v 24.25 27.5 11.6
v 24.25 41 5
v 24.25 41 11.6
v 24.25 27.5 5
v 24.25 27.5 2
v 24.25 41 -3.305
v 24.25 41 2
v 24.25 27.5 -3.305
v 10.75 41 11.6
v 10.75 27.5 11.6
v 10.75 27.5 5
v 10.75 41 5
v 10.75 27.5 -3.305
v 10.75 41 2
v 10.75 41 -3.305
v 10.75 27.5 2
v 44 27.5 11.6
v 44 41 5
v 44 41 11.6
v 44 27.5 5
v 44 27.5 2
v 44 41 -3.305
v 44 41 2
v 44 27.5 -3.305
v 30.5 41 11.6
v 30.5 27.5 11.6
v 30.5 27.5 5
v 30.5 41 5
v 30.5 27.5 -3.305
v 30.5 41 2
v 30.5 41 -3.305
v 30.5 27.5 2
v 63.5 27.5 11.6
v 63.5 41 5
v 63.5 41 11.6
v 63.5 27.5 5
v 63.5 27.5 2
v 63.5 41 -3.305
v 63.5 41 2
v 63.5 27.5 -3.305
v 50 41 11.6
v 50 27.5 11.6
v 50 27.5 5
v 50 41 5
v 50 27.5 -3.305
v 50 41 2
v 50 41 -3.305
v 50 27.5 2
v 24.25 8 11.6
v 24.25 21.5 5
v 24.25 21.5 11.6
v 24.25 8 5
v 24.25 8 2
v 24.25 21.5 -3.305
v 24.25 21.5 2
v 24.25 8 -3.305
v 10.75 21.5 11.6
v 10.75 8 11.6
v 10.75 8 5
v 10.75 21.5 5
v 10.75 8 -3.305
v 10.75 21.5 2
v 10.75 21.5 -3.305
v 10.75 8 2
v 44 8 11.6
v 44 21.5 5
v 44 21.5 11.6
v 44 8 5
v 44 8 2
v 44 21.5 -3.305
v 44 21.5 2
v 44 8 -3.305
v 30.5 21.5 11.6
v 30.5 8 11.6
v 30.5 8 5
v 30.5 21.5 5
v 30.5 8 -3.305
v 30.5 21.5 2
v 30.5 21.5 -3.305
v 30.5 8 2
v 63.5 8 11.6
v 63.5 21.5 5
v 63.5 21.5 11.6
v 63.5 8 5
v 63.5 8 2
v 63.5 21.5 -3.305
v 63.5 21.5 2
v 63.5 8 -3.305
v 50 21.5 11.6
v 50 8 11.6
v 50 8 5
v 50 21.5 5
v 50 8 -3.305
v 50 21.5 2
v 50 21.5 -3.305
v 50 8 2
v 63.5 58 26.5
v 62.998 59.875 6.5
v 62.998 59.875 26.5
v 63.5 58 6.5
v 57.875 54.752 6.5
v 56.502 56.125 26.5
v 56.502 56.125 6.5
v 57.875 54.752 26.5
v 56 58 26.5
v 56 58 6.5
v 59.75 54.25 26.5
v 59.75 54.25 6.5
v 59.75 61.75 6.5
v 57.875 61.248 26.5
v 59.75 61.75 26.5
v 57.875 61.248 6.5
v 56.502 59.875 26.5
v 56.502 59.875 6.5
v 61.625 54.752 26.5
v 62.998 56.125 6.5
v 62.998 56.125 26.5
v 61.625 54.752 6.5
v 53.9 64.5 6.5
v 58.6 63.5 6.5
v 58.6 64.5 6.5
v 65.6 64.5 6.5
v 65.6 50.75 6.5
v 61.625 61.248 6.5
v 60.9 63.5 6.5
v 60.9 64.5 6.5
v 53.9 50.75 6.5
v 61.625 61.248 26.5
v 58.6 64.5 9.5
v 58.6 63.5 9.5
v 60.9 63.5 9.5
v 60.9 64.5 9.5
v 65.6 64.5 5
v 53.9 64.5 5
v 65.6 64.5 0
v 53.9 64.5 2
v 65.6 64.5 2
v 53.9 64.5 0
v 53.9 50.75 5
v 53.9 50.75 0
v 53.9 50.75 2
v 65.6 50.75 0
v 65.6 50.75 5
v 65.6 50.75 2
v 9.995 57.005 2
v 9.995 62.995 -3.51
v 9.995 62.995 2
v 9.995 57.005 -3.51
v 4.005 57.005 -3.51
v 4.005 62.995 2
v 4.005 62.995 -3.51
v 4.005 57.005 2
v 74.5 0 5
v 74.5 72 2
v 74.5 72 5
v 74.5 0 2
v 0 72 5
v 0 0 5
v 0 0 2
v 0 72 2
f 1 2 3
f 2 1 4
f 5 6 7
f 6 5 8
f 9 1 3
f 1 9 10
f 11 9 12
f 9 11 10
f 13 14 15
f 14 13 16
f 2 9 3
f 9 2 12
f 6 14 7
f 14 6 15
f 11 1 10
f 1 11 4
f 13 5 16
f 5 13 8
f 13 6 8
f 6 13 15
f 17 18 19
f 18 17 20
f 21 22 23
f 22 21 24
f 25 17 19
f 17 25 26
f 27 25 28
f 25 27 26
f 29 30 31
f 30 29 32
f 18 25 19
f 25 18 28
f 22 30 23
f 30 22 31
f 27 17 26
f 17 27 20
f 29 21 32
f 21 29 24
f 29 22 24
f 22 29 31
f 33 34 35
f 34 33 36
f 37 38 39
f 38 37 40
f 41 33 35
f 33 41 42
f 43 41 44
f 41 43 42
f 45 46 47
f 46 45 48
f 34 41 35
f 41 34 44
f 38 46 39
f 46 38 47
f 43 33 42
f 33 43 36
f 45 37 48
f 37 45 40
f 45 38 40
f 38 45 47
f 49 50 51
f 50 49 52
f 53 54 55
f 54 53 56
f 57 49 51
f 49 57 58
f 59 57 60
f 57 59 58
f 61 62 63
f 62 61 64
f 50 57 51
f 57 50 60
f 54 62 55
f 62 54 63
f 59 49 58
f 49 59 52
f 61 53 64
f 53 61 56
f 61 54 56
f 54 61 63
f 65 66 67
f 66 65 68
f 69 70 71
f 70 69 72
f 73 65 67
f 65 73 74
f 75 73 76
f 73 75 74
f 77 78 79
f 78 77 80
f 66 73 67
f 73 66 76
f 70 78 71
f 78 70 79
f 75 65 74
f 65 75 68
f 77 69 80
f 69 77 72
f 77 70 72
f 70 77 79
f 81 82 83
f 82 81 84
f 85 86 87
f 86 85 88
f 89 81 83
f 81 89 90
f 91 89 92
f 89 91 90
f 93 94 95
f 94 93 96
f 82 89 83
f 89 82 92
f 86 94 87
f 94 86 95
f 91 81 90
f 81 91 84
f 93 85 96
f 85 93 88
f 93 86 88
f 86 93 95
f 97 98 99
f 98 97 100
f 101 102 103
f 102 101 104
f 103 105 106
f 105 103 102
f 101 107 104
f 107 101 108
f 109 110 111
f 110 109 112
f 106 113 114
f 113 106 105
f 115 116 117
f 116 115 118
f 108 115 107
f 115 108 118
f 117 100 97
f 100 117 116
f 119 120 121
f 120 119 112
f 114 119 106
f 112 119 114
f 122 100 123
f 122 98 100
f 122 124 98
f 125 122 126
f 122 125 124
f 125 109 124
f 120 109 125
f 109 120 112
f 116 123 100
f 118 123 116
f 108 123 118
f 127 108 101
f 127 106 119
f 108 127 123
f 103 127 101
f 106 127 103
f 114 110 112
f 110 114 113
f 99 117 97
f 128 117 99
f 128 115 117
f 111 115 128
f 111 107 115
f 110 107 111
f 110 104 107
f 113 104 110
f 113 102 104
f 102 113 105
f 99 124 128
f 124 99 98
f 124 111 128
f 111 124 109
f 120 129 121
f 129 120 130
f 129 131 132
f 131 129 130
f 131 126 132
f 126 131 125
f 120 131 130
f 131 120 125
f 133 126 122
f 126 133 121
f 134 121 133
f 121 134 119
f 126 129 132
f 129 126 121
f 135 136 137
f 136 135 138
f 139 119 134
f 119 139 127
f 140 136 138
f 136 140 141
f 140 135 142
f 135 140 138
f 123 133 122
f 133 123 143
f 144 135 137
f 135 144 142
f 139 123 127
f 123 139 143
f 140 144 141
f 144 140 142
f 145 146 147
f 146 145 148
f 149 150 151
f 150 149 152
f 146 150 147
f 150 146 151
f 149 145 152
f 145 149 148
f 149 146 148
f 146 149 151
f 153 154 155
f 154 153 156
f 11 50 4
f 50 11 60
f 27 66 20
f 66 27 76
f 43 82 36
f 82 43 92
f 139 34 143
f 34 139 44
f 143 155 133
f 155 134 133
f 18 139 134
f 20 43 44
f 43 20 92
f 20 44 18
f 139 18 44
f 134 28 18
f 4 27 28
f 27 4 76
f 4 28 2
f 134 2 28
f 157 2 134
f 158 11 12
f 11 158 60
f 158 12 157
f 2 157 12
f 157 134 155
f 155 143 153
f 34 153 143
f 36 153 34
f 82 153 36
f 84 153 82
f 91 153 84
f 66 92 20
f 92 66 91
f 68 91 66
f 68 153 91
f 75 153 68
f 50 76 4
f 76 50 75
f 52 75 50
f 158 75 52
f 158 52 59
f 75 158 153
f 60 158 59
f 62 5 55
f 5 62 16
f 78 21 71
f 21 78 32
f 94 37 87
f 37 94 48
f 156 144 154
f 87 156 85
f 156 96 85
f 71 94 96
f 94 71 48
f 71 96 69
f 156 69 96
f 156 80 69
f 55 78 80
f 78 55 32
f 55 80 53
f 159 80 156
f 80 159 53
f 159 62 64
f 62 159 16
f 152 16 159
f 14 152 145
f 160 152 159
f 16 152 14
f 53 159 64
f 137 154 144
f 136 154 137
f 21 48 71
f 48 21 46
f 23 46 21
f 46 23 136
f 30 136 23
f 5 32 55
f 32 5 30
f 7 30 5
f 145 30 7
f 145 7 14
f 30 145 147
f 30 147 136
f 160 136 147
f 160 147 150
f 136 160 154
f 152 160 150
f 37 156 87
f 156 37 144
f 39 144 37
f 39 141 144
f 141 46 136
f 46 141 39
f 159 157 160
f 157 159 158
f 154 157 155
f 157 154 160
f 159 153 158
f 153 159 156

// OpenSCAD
// file: ../../libs/flat-ui-colors.scad
flatui = [
    "#1abc9c",
    "#2ecc71",
    "#3498db",
    "#9b59b6",
    "#34495e",
    "#f1c40f",
    "#e67e22",
    "#e74c3c",
    "#ecf0f1",
    "#95a5a6",
];
// file: ../../libs/teeth.scad
function hash(h,k)= 
(
  h[search([k], h)[0]][1]
); 

module placeTeethY(start, step, count, size) {
    for(i = [0:count]) {
        y = start + (i * step);
        translate([0, y, 0])
        cube(size, center=true);
    }
}

module placeTeethZ(start, step, count, size) {
    for(i = [0:count]) {
        z = start + (i * step);
        translate([0, 0, z])
        cube(size, center=true);
    }
}

module verticalTeeth(translateZ, widthY, depthX, heightZ, count, size, height, spaceBetween = false, padding = 0, nothing = 0.1) {
    avSpace = widthY - (size * count);
    padding = (padding==undef) ? 0 : padding;
    ts = [depthX + nothing + padding, size, height + nothing + padding];
    if (spaceBetween) {
        tbSpace = avSpace / (count - 1);
        tbStep = tbSpace + size;
        tbStart = -(widthY / 2) + (size / 2);
        
        translate([0, 0, translateZ])
        placeTeethY(tbStart, tbStep, count-1, ts);
    } else {
        tbSpace = avSpace / (count + 1);
        tbStep = tbSpace + size;
        tbStart = -(widthY / 2) + tbSpace + (size / 2);
        
        translate([0, 0, translateZ])
        placeTeethY(tbStart, tbStep, count-1, ts);
    }
}

module horizontalTeeth(translateY, widthY, depthX, heightZ, count, size, height, spaceBetween = false, padding = 0, nothing = 0.1) {
    avSpace = heightZ - (size * count);
    padding = (padding==undef) ? 0 : padding;
    ts = [depthX + nothing + padding, height + nothing + padding, size];
    if (spaceBetween) {
        tbSpace = avSpace / (count - 1);
        tbStep = tbSpace + size;
        tbStart = -(heightZ / 2) + (size / 2);
        
        translate([0, translateY, 0])
        placeTeethZ(tbStart, tbStep, count-1, ts);
    } else {
        tbSpace = avSpace / (count + 1);
        tbStep = tbSpace + size;
        tbStart = -(heightZ / 2) + tbSpace + (size / 2);
        
        translate([0, translateY, 0])
        placeTeethZ(tbStart, tbStep, count-1, ts);
    }
}

module bottomTeeth(widthY, depthX, heightZ, count, size, height, spaceBetween = false, padding = 0, nothing = 0.1) {
    z = -(heightZ / 2)-(height/2);
    verticalTeeth(z, widthY, depthX, heightZ, count, size, height, spaceBetween, padding, nothing);
}

module topTeeth(widthY, depthX, heightZ, count, size, height, spaceBetween = false, padding = 0, nothing = 0.1) {
    z = (heightZ / 2)+(height/2);
    verticalTeeth(z, widthY, depthX, heightZ, count, size, height, spaceBetween, padding, nothing);
}

module leftTeeth(widthY, depthX, heightZ, count, size, height, spaceBetween = false, padding = 0, nothing = 0.1) {
    y = -(widthY / 2)-(height / 2);
    horizontalTeeth(y, widthY, depthX, heightZ, count, size, height, spaceBetween, padding, nothing);
}

module rightTeeth(widthY, depthX, heightZ, count, size, height, spaceBetween = false, padding = 0, nothing = 0.1) {
    y = (widthY / 2) + (height / 2);
    horizontalTeeth(y, widthY, depthX, heightZ, count, size, height, spaceBetween, padding, nothing);
}

module teeth(size, opts, nothing = 0.1) {
    union() {
        color("#ef5777") cube(size, center=true);
        
        bc = hash(opts, "bottomCount");
        if (bc > 0) {        
            color("#575fcf") bottomTeeth(
                widthY = size[1],
                depthX = size[0],
                heightZ = size[2],
                count = hash(opts, "bottomCount"),
                size = hash(opts, "bottomSize"),
                height = hash(opts, "bottomHeight"),
                spaceBetween = hash(opts, "bottomSpaceBetween"),
                padding = hash(opts, "bottomPadding"),
                nothing = nothing
            );
        }
        
        tc = hash(opts, "topCount");
        if (tc > 0) {        
            color("#4bcffa") topTeeth(
                widthY = size[1],
                depthX = size[0],
                heightZ = size[2],
                count = hash(opts, "topCount"),
                size = hash(opts, "topSize"),
                height = hash(opts, "topHeight"),
                spaceBetween = hash(opts, "topSpaceBetween"),
                padding = hash(opts, "topPadding"),
                nothing = nothing
            );
        }
        
        lc = hash(opts, "leftCount");
        if (lc > 0) {        
            color("#0be881") leftTeeth(
                widthY = size[1],
                depthX = size[0],
                heightZ = size[2],
                count = hash(opts, "leftCount"),
                size = hash(opts, "leftSize"),
                height = hash(opts, "leftHeight"),
                spaceBetween = hash(opts, "leftSpaceBetween"),
                padding = hash(opts, "leftPadding"),
                nothing = nothing
            );
        }
        
        rc = hash(opts, "rightCount");
        if (rc > 0) {        
            color("#ffc048") rightTeeth(
                widthY = size[1],
                depthX = size[0],
                heightZ = size[2],
                count = hash(opts, "rightCount"),
                size = hash(opts, "rightSize"),
                height = hash(opts, "rightHeight"),
                spaceBetween = hash(opts, "rightSpaceBetween"),
                padding = hash(opts, "rightPadding"),
                nothing = nothing
            );
        }
    }
}


/*opts=[
    ["bottomCount", 3],    
    ["bottomSize", 6],
    ["bottomHeight", 10],
    ["bottomSpaceBetween", true],
    ["bottomPadding", 0.2],

    ["topCount", 3],    
    ["topSize", 6],
    ["topHeight", 10],
    ["topSpaceBetween", false],

    ["leftCount", 3],    
    ["leftSize", 4],
    ["leftHeight", 10],
    ["leftSpaceBetween", true],

    ["rightCount", 2],    
    ["rightSize", 4],
    ["rightHeight", 10],
    ["rightSpaceBetween", false],
];
teeth(size=[10, 50, 30], opts=opts);
*/
// file: ../../libs/t-joint.scad
/**
       Copyright 2016 Matthew Gaunt

   Licensed under the Apache License, Version 2.0 (the "License");
   you may not use this file except in compliance with the License.
   You may obtain a copy of the License at

       http://www.apache.org/licenses/LICENSE-2.0

   Unless required by applicable law or agreed to in writing, software
   distributed under the License is distributed on an "AS IS" BASIS,
   WITHOUT WARRANTIES OR CONDITIONS OF ANY KIND, either express or implied.
   See the License for the specific language governing permissions and
   limitations under the License.
**/

/**
th = thickness
bD = bold diameter
bH = bolt height
sD = screw diameter
sL = screw length
**/
module createTJoint(th, bD, bH, sD, sL, endspacing = 2, nothing = 0.1) {
    union() {
        translate([0, 0, (sL / 2) - nothing])
        color("#ef5777") cube([sD, th + nothing, sL + nothing], center = true);

        translate([0, 0, sL - (bH / 2) - endspacing])
        color("#575fcf") cube([bD, th + nothing, bH], center = true);
        
        translate([0, 0, -(th / 2)])
        color("#4bcffa") cylinder(th + nothing, d=sD, center=true);
    }
}

// Remember https://www.trfastenings.com/Products/knowledgebase/Tables-Standards-Terminology/Tapping-Sizes-and-Clearance-Holes

// createTJoint(th=3, bD=5.5, bH=2.5, sD=3.4, sL=7);
// file: ../../libs/btn-1825910-6.scad
include <./flat-ui-colors.scad>;

btnBumpD = 3.51;
btnBumpH = 0.5;

btnBaseX = 5.99;
btnBaseY = 5.99;
btnBaseH = 3.61;

btnPinsH = 3.51;

/*module encoderPanel(cutout = false, thickness = encoderCutoutH) {
    translate([0, 0, btnBaseH])
    color("#0be881") cylinder(h=encoderCutoutH, d=encoderCutoutD);
    
    if (cutout == false) {
        translate([0, -6, btnBaseH + 1])
        color("#ffc048") cube([2.3, 1, 2], center=true);
        
    } else {
        translate([0, -6, btnBaseH + (thickness / 2)])
        color("#ffc048") cube([2.3, 1, thickness], center=true);
    }
}*/

module btnBump() {
    translate([0, 0, btnBaseH])
    color("#0be881") cylinder(h=btnBumpH, d=btnBumpD);
}

module btnPins() {
    translate([0, 0, -(btnPinsH / 2)])
    color("#4bcffa") cube([btnBaseX, btnBaseY, btnPinsH], center=true);
}

module btn18625910() {
    translate([0, 0, btnBaseH / 2])
    color("#575fcf") cube([btnBaseX, btnBaseY, btnBaseH], center = true);
    
    btnPins();
    
    btnBump();
}

// btn18625910();
// file: ../../libs/rotary-encoder-ACZ11BR1E.scad
include <./flat-ui-colors.scad>;

encoderCutoutD = 7.5;
encoderCutoutH = 20;

encoderKnobD = 14.4;
encoderKnobH = 16.4;

encoderBaseX = 11.7;
encoderBaseY = 13.75;
encoderBaseH = 6.5;

encoderPinsH = 4;

module encoderKnob() {
    translate([0, 0, encoderBaseH + 4])
    color("#ef5777") cylinder(h=encoderKnobH, d=encoderKnobD);
}

module encoderPanel(cutout = false, thickness = encoderCutoutH) {
    translate([0, 0, encoderBaseH])
    color("#0be881") cylinder(h=encoderCutoutH, d=encoderCutoutD);
    
    if (cutout == false) {
        translate([0, -6, encoderBaseH + 1])
        color("#ffc048") cube([2.3, 1, 2], center=true);
        
    } else {
        translate([0, -6, encoderBaseH + (thickness / 2)])
        color("#ffc048") cube([2.3, 1, thickness], center=true);
    }
}

module encoderBase() {
    translate([-(encoderBaseX / 2), -6.5, 0])
    color("#575fcf") cube([encoderBaseX, encoderBaseY, encoderBaseH]);
}

module encoderPins() {
    translate([-(encoderBaseX / 2), -6.5, -encoderPinsH])
    color("#4bcffa") cube([encoderBaseX, encoderBaseY, encoderPinsH]);
}

module rotaryEncoder(cutout=false, thickness = 3) {
    encoderPanel(cutout, thickness);
    encoderBase();
    
    if (cutout == false) {
        encoderKnob();
        
        encoderPins();
    }
}

// rotaryEncoder();

/*rotaryEncoder();

translate([20, 0, 0])
rotaryEncoder(true);*/
// file: ../../libs/cherry-mx-switch.scad
/**
       Copyright 2016 Matthew Gaunt

   Licensed under the Apache License, Version 2.0 (the "License");
   you may not use this file except in compliance with the License.
   You may obtain a copy of the License at

       http://www.apache.org/licenses/LICENSE-2.0

   Unless required by applicable law or agreed to in writing, software
   distributed under the License is distributed on an "AS IS" BASIS,
   WITHOUT WARRANTIES OR CONDITIONS OF ANY KIND, either express or implied.
   See the License for the specific language governing permissions and
   limitations under the License.
**/

nothing=0.01; // See https://3dprinting.stackexchange.com/questions/9794/how-to-prevent-z-fighting-in-openscad

cherryKeyCapH = 6.6;
cherryKeyCapXY = 15.6;

cherrySwitchH = 5;
cherrySwitchXY = 14;

pinH = 3.3;

module cherrymxPlate(kerf = 0.5) {
    xy = cherrySwitchXY - kerf;
    union() {
        translate([0, 0, cherryKeyCapH / 2])
        color("#0be881") cube([xy, xy, cherryKeyCapH], center=true);
        
        translate([0, 0, -2.5])
        color("#ffc048") cube([xy, xy, cherrySwitchH + nothing], center=true);
        
        translate([0, 0, -(cherrySwitchH + (pinH / 2))])
        color("#ffdd59") cube([xy, xy, pinH + nothing], center=true);
    }
}

module cherrymxSwitch() {
    union() {
        translate([0, 0, cherryKeyCapH / 2])
        color("#ef5777") cube([cherryKeyCapXY, cherryKeyCapXY, cherryKeyCapH], center=true);
        
        translate([0, 0, -(cherrySwitchH / 2)])
        color("#575fcf") cube([cherrySwitchXY, cherrySwitchXY, cherrySwitchH], center=true);
        
        translate([0, 0, -(cherrySwitchH + (pinH / 2))])
        color("#4bcffa") cube([cherrySwitchXY, cherrySwitchXY, pinH], center=true);
    }
}

// cherrymxSwitch();

// cherrymxPlate();

module demoPlate() {
    projection() {
        difference() {
            cube([(19.5 * 3) + 8, 19.5 + 8, 3]);

            // 13.85mm
            c = 19.5/2 + 4;
            translate([c, c, 0]) cherrymxPlate(kerf = 0.25);

            // 13.5mm
            translate([c + 19.5, c, 0]) cherrymxPlate(kerf = 0.5);

            // 13mm
            translate([c + (19.5 * 2), c, 0]) cherrymxPlate(kerf = 1);
        }
    }
}

// demoPlate();
// main file
include <../../libs/cherry-mx-switch.scad>;
include <../../libs/rotary-encoder-ACZ11BR1E.scad>;
include <../../libs/btn-1825910-6.scad>;
include <../../libs/t-joint.scad>;
include <../../libs/teeth.scad>;
include <../../libs/flat-ui-colors.scad>;

thickness = 3;
keyCols = 3;
keyRows = 2;

pcbX = 74.5;
pcbY = 72;
pcbH = 1.6;

module cherrymx(cutout) {
    if (cutout) {
        cherrymxPlate();
    } else {
        cherrymxSwitch();
    }
}

module cherrymxKeys(cutout = false) {
    // Key 1
    translate([17.5, 34.25, cherrySwitchH]) cherrymx(cutout);
    
    // Key 2
    translate([37.25, 34.25, cherrySwitchH]) cherrymx(cutout);
    
    // Key 3
    translate([56.75, 34.25, cherrySwitchH]) cherrymx(cutout);
    
    // Key 4
    translate([17.5, 14.75, cherrySwitchH]) cherrymx(cutout);
    
    // Key 5
    translate([37.25, 14.75, cherrySwitchH]) cherrymx(cutout);
    
    // Key 6
    translate([56.75, 14.75, cherrySwitchH]) cherrymx(cutout);
}

module pcb(cutout = false) {
    if (cutout == false) {
        color(flatui[3]) cube([pcbX, pcbY, pcbH]);
    }
}

module parts(cutout=false) {
    cherrymxKeys(cutout);
    
    translate([0, 0, -pcbH]) pcb(cutout);
    
    translate([59.75, 58, 0]) rotate([0, 0, 180]) rotaryEncoder(cutout);
    
    translate([7, 60, 0]) btn18625910();
}

module topLayer() {
    translate([0, 0, cherrySwitchH - thickness])
    color(flatui[8]) cube([pcbX, pcbY, thickness]);
}

module padBottom() {
    translate([0, 0, -padZ - thickness]) color(flatui[3]) cube([padX, padY, thickness]);
}

topLayer();
// padBottom();*/
parts(true);
